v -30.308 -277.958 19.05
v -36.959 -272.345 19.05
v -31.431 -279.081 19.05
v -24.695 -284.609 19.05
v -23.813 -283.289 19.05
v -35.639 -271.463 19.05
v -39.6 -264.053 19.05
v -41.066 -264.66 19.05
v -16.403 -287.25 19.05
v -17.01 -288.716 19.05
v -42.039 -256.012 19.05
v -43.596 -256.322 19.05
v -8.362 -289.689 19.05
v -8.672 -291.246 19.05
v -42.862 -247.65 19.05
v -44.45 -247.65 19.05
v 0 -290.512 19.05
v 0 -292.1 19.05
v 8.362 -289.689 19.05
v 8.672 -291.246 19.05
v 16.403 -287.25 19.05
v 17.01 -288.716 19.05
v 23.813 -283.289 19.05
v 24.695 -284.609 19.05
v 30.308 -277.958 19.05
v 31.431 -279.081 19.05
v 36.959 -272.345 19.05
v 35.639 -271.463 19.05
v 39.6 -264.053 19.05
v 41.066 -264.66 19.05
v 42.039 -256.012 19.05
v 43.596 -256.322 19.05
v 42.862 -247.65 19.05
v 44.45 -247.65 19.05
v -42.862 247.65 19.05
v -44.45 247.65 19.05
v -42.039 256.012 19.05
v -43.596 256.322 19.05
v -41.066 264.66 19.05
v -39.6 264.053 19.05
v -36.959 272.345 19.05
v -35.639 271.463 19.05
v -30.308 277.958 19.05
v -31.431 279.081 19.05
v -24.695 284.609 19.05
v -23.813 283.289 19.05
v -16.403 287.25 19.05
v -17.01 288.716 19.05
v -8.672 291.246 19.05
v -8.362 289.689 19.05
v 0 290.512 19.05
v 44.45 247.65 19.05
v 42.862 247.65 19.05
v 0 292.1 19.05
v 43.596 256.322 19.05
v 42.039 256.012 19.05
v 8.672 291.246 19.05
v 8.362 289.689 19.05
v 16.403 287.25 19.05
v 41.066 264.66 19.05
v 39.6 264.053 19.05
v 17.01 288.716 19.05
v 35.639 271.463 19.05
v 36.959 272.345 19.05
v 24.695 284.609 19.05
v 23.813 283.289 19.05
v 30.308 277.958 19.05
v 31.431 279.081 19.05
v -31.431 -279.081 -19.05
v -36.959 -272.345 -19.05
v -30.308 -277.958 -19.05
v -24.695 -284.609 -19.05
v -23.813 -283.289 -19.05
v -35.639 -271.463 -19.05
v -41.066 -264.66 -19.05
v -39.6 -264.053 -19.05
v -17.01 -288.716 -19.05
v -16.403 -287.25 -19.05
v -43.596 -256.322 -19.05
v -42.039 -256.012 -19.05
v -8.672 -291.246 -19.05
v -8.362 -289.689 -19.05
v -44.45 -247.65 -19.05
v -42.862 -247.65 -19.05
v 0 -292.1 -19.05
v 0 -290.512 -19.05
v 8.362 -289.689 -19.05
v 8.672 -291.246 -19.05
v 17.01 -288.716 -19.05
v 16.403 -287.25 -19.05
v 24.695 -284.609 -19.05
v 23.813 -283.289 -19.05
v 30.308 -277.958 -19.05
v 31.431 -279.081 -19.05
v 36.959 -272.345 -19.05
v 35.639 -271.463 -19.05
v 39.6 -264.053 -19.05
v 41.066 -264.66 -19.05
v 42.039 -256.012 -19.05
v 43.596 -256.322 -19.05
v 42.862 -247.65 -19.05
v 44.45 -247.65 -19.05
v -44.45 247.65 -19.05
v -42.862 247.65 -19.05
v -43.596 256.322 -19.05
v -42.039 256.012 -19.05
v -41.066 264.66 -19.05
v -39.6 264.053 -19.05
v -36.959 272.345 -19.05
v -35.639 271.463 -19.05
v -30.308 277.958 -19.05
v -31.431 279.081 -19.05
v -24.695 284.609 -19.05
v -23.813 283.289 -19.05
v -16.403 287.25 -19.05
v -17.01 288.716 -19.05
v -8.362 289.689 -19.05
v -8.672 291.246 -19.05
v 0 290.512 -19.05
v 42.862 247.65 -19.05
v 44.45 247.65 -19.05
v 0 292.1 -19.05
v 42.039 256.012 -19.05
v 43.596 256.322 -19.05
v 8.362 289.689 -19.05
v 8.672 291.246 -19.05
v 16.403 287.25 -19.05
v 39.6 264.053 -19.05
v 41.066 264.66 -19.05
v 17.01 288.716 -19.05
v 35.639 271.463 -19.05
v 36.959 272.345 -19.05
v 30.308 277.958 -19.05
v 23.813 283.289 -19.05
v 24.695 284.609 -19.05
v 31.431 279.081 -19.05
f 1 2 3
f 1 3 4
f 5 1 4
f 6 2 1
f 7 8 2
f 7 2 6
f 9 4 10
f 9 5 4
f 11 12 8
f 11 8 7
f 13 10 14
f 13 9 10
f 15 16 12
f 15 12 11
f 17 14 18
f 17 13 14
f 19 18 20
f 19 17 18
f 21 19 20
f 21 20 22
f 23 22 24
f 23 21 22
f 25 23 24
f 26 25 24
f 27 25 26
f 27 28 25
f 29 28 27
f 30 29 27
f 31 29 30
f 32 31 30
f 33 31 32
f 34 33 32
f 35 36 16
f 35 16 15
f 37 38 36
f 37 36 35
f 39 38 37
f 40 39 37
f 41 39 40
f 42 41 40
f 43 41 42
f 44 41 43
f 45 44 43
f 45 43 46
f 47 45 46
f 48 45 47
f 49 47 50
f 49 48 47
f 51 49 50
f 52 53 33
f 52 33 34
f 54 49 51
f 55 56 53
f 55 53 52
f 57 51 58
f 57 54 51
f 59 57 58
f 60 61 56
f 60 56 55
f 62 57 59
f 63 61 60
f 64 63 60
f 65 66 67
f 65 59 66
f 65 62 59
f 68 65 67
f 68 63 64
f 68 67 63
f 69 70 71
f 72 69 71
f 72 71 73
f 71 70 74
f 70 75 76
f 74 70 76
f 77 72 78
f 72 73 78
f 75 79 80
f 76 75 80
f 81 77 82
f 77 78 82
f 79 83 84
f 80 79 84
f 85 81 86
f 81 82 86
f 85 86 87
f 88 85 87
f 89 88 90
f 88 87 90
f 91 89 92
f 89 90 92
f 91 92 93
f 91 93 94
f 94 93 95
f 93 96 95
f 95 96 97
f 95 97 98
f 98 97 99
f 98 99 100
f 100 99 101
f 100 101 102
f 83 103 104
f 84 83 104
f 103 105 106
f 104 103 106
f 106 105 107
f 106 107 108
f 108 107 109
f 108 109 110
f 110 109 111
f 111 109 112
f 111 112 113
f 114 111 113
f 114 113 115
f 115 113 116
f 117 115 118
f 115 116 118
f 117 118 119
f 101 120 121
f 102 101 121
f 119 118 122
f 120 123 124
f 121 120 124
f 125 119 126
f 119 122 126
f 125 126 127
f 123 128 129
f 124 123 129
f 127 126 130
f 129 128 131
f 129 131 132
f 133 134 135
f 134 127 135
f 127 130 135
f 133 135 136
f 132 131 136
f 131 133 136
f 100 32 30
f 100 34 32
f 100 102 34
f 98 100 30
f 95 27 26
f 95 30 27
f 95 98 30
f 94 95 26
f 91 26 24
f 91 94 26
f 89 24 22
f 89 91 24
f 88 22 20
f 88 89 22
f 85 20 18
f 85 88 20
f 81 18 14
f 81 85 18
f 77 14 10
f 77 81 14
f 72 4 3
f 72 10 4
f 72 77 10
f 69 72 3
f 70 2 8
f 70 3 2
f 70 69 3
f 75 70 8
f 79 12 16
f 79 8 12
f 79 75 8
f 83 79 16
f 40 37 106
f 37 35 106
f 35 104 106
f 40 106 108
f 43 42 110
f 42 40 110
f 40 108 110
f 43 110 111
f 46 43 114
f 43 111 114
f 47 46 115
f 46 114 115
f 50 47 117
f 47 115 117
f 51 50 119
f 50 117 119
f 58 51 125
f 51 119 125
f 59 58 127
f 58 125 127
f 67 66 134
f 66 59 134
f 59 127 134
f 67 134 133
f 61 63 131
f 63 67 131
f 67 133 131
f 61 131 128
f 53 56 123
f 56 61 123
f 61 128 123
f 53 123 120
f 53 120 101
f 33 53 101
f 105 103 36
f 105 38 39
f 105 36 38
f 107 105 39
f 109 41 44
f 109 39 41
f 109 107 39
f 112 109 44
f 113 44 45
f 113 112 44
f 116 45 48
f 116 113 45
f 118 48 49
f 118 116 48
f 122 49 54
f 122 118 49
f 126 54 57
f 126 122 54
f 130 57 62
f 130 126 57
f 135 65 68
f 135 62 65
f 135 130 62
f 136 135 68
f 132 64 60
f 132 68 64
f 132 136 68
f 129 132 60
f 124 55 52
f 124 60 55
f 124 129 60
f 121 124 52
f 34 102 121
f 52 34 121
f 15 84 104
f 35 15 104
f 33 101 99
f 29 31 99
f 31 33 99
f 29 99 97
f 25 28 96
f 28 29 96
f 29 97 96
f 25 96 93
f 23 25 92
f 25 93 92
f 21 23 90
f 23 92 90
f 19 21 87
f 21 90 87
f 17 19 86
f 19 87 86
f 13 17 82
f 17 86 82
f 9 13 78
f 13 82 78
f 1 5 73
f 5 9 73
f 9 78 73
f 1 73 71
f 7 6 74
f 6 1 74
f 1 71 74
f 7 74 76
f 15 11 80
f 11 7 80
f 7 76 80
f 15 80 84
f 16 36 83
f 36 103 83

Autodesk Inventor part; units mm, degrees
ref_plane "YZ Plane" through (0, 0, 0) normal (1, 0, 0) x (0, 1, 0)
ref_plane "XZ Plane" through (0, 0, 0) normal (0, 1, 0) x (-1, 0, 0)
ref_plane "XY Plane" through (0, 0, 0) normal (0, 0, 1) x (1, 0, 0)
sketch "Sketch1" plane through (0, 0, 0) normal (0, 0, 1) x (1, 0, 0)
  line L0 (0, 247.65) -> (0, -247.65) construction
  line L1 (-44.45, 247.65) -> (-44.45, -247.65)
  line L2 (44.45, -247.65) -> (44.45, 247.65)
  arc A0 (44.45, 247.65) -> (-44.45, 247.65) centre (0, 247.65) ccw
  arc A1 (-44.45, -247.65) -> (44.45, -247.65) centre (0, -247.65) ccw
  line L3 (-42.8625, -247.65) -> (-42.8625, 247.65)
  arc A2 (42.8625, 247.65) -> (-42.8625, 247.65) centre (0, 247.65) ccw
  line L4 (42.8625, 247.65) -> (42.8625, -247.65)
  arc A3 (-42.8625, -247.65) -> (42.8625, -247.65) centre (0, -247.65) ccw
  point P0 (0, 0)
  dimension "d0" = 495.3
  dimension "d2" = 1.5875
  dimension "d5" = 88.9
extrude "Extrusion1" add sketch "Sketch1" along normal mid plane 38.1
properties part number "1_16 Thick x 1.5 Wide Urethane Flat Belting (10 Long)(217-6001)" material "Rubber"
